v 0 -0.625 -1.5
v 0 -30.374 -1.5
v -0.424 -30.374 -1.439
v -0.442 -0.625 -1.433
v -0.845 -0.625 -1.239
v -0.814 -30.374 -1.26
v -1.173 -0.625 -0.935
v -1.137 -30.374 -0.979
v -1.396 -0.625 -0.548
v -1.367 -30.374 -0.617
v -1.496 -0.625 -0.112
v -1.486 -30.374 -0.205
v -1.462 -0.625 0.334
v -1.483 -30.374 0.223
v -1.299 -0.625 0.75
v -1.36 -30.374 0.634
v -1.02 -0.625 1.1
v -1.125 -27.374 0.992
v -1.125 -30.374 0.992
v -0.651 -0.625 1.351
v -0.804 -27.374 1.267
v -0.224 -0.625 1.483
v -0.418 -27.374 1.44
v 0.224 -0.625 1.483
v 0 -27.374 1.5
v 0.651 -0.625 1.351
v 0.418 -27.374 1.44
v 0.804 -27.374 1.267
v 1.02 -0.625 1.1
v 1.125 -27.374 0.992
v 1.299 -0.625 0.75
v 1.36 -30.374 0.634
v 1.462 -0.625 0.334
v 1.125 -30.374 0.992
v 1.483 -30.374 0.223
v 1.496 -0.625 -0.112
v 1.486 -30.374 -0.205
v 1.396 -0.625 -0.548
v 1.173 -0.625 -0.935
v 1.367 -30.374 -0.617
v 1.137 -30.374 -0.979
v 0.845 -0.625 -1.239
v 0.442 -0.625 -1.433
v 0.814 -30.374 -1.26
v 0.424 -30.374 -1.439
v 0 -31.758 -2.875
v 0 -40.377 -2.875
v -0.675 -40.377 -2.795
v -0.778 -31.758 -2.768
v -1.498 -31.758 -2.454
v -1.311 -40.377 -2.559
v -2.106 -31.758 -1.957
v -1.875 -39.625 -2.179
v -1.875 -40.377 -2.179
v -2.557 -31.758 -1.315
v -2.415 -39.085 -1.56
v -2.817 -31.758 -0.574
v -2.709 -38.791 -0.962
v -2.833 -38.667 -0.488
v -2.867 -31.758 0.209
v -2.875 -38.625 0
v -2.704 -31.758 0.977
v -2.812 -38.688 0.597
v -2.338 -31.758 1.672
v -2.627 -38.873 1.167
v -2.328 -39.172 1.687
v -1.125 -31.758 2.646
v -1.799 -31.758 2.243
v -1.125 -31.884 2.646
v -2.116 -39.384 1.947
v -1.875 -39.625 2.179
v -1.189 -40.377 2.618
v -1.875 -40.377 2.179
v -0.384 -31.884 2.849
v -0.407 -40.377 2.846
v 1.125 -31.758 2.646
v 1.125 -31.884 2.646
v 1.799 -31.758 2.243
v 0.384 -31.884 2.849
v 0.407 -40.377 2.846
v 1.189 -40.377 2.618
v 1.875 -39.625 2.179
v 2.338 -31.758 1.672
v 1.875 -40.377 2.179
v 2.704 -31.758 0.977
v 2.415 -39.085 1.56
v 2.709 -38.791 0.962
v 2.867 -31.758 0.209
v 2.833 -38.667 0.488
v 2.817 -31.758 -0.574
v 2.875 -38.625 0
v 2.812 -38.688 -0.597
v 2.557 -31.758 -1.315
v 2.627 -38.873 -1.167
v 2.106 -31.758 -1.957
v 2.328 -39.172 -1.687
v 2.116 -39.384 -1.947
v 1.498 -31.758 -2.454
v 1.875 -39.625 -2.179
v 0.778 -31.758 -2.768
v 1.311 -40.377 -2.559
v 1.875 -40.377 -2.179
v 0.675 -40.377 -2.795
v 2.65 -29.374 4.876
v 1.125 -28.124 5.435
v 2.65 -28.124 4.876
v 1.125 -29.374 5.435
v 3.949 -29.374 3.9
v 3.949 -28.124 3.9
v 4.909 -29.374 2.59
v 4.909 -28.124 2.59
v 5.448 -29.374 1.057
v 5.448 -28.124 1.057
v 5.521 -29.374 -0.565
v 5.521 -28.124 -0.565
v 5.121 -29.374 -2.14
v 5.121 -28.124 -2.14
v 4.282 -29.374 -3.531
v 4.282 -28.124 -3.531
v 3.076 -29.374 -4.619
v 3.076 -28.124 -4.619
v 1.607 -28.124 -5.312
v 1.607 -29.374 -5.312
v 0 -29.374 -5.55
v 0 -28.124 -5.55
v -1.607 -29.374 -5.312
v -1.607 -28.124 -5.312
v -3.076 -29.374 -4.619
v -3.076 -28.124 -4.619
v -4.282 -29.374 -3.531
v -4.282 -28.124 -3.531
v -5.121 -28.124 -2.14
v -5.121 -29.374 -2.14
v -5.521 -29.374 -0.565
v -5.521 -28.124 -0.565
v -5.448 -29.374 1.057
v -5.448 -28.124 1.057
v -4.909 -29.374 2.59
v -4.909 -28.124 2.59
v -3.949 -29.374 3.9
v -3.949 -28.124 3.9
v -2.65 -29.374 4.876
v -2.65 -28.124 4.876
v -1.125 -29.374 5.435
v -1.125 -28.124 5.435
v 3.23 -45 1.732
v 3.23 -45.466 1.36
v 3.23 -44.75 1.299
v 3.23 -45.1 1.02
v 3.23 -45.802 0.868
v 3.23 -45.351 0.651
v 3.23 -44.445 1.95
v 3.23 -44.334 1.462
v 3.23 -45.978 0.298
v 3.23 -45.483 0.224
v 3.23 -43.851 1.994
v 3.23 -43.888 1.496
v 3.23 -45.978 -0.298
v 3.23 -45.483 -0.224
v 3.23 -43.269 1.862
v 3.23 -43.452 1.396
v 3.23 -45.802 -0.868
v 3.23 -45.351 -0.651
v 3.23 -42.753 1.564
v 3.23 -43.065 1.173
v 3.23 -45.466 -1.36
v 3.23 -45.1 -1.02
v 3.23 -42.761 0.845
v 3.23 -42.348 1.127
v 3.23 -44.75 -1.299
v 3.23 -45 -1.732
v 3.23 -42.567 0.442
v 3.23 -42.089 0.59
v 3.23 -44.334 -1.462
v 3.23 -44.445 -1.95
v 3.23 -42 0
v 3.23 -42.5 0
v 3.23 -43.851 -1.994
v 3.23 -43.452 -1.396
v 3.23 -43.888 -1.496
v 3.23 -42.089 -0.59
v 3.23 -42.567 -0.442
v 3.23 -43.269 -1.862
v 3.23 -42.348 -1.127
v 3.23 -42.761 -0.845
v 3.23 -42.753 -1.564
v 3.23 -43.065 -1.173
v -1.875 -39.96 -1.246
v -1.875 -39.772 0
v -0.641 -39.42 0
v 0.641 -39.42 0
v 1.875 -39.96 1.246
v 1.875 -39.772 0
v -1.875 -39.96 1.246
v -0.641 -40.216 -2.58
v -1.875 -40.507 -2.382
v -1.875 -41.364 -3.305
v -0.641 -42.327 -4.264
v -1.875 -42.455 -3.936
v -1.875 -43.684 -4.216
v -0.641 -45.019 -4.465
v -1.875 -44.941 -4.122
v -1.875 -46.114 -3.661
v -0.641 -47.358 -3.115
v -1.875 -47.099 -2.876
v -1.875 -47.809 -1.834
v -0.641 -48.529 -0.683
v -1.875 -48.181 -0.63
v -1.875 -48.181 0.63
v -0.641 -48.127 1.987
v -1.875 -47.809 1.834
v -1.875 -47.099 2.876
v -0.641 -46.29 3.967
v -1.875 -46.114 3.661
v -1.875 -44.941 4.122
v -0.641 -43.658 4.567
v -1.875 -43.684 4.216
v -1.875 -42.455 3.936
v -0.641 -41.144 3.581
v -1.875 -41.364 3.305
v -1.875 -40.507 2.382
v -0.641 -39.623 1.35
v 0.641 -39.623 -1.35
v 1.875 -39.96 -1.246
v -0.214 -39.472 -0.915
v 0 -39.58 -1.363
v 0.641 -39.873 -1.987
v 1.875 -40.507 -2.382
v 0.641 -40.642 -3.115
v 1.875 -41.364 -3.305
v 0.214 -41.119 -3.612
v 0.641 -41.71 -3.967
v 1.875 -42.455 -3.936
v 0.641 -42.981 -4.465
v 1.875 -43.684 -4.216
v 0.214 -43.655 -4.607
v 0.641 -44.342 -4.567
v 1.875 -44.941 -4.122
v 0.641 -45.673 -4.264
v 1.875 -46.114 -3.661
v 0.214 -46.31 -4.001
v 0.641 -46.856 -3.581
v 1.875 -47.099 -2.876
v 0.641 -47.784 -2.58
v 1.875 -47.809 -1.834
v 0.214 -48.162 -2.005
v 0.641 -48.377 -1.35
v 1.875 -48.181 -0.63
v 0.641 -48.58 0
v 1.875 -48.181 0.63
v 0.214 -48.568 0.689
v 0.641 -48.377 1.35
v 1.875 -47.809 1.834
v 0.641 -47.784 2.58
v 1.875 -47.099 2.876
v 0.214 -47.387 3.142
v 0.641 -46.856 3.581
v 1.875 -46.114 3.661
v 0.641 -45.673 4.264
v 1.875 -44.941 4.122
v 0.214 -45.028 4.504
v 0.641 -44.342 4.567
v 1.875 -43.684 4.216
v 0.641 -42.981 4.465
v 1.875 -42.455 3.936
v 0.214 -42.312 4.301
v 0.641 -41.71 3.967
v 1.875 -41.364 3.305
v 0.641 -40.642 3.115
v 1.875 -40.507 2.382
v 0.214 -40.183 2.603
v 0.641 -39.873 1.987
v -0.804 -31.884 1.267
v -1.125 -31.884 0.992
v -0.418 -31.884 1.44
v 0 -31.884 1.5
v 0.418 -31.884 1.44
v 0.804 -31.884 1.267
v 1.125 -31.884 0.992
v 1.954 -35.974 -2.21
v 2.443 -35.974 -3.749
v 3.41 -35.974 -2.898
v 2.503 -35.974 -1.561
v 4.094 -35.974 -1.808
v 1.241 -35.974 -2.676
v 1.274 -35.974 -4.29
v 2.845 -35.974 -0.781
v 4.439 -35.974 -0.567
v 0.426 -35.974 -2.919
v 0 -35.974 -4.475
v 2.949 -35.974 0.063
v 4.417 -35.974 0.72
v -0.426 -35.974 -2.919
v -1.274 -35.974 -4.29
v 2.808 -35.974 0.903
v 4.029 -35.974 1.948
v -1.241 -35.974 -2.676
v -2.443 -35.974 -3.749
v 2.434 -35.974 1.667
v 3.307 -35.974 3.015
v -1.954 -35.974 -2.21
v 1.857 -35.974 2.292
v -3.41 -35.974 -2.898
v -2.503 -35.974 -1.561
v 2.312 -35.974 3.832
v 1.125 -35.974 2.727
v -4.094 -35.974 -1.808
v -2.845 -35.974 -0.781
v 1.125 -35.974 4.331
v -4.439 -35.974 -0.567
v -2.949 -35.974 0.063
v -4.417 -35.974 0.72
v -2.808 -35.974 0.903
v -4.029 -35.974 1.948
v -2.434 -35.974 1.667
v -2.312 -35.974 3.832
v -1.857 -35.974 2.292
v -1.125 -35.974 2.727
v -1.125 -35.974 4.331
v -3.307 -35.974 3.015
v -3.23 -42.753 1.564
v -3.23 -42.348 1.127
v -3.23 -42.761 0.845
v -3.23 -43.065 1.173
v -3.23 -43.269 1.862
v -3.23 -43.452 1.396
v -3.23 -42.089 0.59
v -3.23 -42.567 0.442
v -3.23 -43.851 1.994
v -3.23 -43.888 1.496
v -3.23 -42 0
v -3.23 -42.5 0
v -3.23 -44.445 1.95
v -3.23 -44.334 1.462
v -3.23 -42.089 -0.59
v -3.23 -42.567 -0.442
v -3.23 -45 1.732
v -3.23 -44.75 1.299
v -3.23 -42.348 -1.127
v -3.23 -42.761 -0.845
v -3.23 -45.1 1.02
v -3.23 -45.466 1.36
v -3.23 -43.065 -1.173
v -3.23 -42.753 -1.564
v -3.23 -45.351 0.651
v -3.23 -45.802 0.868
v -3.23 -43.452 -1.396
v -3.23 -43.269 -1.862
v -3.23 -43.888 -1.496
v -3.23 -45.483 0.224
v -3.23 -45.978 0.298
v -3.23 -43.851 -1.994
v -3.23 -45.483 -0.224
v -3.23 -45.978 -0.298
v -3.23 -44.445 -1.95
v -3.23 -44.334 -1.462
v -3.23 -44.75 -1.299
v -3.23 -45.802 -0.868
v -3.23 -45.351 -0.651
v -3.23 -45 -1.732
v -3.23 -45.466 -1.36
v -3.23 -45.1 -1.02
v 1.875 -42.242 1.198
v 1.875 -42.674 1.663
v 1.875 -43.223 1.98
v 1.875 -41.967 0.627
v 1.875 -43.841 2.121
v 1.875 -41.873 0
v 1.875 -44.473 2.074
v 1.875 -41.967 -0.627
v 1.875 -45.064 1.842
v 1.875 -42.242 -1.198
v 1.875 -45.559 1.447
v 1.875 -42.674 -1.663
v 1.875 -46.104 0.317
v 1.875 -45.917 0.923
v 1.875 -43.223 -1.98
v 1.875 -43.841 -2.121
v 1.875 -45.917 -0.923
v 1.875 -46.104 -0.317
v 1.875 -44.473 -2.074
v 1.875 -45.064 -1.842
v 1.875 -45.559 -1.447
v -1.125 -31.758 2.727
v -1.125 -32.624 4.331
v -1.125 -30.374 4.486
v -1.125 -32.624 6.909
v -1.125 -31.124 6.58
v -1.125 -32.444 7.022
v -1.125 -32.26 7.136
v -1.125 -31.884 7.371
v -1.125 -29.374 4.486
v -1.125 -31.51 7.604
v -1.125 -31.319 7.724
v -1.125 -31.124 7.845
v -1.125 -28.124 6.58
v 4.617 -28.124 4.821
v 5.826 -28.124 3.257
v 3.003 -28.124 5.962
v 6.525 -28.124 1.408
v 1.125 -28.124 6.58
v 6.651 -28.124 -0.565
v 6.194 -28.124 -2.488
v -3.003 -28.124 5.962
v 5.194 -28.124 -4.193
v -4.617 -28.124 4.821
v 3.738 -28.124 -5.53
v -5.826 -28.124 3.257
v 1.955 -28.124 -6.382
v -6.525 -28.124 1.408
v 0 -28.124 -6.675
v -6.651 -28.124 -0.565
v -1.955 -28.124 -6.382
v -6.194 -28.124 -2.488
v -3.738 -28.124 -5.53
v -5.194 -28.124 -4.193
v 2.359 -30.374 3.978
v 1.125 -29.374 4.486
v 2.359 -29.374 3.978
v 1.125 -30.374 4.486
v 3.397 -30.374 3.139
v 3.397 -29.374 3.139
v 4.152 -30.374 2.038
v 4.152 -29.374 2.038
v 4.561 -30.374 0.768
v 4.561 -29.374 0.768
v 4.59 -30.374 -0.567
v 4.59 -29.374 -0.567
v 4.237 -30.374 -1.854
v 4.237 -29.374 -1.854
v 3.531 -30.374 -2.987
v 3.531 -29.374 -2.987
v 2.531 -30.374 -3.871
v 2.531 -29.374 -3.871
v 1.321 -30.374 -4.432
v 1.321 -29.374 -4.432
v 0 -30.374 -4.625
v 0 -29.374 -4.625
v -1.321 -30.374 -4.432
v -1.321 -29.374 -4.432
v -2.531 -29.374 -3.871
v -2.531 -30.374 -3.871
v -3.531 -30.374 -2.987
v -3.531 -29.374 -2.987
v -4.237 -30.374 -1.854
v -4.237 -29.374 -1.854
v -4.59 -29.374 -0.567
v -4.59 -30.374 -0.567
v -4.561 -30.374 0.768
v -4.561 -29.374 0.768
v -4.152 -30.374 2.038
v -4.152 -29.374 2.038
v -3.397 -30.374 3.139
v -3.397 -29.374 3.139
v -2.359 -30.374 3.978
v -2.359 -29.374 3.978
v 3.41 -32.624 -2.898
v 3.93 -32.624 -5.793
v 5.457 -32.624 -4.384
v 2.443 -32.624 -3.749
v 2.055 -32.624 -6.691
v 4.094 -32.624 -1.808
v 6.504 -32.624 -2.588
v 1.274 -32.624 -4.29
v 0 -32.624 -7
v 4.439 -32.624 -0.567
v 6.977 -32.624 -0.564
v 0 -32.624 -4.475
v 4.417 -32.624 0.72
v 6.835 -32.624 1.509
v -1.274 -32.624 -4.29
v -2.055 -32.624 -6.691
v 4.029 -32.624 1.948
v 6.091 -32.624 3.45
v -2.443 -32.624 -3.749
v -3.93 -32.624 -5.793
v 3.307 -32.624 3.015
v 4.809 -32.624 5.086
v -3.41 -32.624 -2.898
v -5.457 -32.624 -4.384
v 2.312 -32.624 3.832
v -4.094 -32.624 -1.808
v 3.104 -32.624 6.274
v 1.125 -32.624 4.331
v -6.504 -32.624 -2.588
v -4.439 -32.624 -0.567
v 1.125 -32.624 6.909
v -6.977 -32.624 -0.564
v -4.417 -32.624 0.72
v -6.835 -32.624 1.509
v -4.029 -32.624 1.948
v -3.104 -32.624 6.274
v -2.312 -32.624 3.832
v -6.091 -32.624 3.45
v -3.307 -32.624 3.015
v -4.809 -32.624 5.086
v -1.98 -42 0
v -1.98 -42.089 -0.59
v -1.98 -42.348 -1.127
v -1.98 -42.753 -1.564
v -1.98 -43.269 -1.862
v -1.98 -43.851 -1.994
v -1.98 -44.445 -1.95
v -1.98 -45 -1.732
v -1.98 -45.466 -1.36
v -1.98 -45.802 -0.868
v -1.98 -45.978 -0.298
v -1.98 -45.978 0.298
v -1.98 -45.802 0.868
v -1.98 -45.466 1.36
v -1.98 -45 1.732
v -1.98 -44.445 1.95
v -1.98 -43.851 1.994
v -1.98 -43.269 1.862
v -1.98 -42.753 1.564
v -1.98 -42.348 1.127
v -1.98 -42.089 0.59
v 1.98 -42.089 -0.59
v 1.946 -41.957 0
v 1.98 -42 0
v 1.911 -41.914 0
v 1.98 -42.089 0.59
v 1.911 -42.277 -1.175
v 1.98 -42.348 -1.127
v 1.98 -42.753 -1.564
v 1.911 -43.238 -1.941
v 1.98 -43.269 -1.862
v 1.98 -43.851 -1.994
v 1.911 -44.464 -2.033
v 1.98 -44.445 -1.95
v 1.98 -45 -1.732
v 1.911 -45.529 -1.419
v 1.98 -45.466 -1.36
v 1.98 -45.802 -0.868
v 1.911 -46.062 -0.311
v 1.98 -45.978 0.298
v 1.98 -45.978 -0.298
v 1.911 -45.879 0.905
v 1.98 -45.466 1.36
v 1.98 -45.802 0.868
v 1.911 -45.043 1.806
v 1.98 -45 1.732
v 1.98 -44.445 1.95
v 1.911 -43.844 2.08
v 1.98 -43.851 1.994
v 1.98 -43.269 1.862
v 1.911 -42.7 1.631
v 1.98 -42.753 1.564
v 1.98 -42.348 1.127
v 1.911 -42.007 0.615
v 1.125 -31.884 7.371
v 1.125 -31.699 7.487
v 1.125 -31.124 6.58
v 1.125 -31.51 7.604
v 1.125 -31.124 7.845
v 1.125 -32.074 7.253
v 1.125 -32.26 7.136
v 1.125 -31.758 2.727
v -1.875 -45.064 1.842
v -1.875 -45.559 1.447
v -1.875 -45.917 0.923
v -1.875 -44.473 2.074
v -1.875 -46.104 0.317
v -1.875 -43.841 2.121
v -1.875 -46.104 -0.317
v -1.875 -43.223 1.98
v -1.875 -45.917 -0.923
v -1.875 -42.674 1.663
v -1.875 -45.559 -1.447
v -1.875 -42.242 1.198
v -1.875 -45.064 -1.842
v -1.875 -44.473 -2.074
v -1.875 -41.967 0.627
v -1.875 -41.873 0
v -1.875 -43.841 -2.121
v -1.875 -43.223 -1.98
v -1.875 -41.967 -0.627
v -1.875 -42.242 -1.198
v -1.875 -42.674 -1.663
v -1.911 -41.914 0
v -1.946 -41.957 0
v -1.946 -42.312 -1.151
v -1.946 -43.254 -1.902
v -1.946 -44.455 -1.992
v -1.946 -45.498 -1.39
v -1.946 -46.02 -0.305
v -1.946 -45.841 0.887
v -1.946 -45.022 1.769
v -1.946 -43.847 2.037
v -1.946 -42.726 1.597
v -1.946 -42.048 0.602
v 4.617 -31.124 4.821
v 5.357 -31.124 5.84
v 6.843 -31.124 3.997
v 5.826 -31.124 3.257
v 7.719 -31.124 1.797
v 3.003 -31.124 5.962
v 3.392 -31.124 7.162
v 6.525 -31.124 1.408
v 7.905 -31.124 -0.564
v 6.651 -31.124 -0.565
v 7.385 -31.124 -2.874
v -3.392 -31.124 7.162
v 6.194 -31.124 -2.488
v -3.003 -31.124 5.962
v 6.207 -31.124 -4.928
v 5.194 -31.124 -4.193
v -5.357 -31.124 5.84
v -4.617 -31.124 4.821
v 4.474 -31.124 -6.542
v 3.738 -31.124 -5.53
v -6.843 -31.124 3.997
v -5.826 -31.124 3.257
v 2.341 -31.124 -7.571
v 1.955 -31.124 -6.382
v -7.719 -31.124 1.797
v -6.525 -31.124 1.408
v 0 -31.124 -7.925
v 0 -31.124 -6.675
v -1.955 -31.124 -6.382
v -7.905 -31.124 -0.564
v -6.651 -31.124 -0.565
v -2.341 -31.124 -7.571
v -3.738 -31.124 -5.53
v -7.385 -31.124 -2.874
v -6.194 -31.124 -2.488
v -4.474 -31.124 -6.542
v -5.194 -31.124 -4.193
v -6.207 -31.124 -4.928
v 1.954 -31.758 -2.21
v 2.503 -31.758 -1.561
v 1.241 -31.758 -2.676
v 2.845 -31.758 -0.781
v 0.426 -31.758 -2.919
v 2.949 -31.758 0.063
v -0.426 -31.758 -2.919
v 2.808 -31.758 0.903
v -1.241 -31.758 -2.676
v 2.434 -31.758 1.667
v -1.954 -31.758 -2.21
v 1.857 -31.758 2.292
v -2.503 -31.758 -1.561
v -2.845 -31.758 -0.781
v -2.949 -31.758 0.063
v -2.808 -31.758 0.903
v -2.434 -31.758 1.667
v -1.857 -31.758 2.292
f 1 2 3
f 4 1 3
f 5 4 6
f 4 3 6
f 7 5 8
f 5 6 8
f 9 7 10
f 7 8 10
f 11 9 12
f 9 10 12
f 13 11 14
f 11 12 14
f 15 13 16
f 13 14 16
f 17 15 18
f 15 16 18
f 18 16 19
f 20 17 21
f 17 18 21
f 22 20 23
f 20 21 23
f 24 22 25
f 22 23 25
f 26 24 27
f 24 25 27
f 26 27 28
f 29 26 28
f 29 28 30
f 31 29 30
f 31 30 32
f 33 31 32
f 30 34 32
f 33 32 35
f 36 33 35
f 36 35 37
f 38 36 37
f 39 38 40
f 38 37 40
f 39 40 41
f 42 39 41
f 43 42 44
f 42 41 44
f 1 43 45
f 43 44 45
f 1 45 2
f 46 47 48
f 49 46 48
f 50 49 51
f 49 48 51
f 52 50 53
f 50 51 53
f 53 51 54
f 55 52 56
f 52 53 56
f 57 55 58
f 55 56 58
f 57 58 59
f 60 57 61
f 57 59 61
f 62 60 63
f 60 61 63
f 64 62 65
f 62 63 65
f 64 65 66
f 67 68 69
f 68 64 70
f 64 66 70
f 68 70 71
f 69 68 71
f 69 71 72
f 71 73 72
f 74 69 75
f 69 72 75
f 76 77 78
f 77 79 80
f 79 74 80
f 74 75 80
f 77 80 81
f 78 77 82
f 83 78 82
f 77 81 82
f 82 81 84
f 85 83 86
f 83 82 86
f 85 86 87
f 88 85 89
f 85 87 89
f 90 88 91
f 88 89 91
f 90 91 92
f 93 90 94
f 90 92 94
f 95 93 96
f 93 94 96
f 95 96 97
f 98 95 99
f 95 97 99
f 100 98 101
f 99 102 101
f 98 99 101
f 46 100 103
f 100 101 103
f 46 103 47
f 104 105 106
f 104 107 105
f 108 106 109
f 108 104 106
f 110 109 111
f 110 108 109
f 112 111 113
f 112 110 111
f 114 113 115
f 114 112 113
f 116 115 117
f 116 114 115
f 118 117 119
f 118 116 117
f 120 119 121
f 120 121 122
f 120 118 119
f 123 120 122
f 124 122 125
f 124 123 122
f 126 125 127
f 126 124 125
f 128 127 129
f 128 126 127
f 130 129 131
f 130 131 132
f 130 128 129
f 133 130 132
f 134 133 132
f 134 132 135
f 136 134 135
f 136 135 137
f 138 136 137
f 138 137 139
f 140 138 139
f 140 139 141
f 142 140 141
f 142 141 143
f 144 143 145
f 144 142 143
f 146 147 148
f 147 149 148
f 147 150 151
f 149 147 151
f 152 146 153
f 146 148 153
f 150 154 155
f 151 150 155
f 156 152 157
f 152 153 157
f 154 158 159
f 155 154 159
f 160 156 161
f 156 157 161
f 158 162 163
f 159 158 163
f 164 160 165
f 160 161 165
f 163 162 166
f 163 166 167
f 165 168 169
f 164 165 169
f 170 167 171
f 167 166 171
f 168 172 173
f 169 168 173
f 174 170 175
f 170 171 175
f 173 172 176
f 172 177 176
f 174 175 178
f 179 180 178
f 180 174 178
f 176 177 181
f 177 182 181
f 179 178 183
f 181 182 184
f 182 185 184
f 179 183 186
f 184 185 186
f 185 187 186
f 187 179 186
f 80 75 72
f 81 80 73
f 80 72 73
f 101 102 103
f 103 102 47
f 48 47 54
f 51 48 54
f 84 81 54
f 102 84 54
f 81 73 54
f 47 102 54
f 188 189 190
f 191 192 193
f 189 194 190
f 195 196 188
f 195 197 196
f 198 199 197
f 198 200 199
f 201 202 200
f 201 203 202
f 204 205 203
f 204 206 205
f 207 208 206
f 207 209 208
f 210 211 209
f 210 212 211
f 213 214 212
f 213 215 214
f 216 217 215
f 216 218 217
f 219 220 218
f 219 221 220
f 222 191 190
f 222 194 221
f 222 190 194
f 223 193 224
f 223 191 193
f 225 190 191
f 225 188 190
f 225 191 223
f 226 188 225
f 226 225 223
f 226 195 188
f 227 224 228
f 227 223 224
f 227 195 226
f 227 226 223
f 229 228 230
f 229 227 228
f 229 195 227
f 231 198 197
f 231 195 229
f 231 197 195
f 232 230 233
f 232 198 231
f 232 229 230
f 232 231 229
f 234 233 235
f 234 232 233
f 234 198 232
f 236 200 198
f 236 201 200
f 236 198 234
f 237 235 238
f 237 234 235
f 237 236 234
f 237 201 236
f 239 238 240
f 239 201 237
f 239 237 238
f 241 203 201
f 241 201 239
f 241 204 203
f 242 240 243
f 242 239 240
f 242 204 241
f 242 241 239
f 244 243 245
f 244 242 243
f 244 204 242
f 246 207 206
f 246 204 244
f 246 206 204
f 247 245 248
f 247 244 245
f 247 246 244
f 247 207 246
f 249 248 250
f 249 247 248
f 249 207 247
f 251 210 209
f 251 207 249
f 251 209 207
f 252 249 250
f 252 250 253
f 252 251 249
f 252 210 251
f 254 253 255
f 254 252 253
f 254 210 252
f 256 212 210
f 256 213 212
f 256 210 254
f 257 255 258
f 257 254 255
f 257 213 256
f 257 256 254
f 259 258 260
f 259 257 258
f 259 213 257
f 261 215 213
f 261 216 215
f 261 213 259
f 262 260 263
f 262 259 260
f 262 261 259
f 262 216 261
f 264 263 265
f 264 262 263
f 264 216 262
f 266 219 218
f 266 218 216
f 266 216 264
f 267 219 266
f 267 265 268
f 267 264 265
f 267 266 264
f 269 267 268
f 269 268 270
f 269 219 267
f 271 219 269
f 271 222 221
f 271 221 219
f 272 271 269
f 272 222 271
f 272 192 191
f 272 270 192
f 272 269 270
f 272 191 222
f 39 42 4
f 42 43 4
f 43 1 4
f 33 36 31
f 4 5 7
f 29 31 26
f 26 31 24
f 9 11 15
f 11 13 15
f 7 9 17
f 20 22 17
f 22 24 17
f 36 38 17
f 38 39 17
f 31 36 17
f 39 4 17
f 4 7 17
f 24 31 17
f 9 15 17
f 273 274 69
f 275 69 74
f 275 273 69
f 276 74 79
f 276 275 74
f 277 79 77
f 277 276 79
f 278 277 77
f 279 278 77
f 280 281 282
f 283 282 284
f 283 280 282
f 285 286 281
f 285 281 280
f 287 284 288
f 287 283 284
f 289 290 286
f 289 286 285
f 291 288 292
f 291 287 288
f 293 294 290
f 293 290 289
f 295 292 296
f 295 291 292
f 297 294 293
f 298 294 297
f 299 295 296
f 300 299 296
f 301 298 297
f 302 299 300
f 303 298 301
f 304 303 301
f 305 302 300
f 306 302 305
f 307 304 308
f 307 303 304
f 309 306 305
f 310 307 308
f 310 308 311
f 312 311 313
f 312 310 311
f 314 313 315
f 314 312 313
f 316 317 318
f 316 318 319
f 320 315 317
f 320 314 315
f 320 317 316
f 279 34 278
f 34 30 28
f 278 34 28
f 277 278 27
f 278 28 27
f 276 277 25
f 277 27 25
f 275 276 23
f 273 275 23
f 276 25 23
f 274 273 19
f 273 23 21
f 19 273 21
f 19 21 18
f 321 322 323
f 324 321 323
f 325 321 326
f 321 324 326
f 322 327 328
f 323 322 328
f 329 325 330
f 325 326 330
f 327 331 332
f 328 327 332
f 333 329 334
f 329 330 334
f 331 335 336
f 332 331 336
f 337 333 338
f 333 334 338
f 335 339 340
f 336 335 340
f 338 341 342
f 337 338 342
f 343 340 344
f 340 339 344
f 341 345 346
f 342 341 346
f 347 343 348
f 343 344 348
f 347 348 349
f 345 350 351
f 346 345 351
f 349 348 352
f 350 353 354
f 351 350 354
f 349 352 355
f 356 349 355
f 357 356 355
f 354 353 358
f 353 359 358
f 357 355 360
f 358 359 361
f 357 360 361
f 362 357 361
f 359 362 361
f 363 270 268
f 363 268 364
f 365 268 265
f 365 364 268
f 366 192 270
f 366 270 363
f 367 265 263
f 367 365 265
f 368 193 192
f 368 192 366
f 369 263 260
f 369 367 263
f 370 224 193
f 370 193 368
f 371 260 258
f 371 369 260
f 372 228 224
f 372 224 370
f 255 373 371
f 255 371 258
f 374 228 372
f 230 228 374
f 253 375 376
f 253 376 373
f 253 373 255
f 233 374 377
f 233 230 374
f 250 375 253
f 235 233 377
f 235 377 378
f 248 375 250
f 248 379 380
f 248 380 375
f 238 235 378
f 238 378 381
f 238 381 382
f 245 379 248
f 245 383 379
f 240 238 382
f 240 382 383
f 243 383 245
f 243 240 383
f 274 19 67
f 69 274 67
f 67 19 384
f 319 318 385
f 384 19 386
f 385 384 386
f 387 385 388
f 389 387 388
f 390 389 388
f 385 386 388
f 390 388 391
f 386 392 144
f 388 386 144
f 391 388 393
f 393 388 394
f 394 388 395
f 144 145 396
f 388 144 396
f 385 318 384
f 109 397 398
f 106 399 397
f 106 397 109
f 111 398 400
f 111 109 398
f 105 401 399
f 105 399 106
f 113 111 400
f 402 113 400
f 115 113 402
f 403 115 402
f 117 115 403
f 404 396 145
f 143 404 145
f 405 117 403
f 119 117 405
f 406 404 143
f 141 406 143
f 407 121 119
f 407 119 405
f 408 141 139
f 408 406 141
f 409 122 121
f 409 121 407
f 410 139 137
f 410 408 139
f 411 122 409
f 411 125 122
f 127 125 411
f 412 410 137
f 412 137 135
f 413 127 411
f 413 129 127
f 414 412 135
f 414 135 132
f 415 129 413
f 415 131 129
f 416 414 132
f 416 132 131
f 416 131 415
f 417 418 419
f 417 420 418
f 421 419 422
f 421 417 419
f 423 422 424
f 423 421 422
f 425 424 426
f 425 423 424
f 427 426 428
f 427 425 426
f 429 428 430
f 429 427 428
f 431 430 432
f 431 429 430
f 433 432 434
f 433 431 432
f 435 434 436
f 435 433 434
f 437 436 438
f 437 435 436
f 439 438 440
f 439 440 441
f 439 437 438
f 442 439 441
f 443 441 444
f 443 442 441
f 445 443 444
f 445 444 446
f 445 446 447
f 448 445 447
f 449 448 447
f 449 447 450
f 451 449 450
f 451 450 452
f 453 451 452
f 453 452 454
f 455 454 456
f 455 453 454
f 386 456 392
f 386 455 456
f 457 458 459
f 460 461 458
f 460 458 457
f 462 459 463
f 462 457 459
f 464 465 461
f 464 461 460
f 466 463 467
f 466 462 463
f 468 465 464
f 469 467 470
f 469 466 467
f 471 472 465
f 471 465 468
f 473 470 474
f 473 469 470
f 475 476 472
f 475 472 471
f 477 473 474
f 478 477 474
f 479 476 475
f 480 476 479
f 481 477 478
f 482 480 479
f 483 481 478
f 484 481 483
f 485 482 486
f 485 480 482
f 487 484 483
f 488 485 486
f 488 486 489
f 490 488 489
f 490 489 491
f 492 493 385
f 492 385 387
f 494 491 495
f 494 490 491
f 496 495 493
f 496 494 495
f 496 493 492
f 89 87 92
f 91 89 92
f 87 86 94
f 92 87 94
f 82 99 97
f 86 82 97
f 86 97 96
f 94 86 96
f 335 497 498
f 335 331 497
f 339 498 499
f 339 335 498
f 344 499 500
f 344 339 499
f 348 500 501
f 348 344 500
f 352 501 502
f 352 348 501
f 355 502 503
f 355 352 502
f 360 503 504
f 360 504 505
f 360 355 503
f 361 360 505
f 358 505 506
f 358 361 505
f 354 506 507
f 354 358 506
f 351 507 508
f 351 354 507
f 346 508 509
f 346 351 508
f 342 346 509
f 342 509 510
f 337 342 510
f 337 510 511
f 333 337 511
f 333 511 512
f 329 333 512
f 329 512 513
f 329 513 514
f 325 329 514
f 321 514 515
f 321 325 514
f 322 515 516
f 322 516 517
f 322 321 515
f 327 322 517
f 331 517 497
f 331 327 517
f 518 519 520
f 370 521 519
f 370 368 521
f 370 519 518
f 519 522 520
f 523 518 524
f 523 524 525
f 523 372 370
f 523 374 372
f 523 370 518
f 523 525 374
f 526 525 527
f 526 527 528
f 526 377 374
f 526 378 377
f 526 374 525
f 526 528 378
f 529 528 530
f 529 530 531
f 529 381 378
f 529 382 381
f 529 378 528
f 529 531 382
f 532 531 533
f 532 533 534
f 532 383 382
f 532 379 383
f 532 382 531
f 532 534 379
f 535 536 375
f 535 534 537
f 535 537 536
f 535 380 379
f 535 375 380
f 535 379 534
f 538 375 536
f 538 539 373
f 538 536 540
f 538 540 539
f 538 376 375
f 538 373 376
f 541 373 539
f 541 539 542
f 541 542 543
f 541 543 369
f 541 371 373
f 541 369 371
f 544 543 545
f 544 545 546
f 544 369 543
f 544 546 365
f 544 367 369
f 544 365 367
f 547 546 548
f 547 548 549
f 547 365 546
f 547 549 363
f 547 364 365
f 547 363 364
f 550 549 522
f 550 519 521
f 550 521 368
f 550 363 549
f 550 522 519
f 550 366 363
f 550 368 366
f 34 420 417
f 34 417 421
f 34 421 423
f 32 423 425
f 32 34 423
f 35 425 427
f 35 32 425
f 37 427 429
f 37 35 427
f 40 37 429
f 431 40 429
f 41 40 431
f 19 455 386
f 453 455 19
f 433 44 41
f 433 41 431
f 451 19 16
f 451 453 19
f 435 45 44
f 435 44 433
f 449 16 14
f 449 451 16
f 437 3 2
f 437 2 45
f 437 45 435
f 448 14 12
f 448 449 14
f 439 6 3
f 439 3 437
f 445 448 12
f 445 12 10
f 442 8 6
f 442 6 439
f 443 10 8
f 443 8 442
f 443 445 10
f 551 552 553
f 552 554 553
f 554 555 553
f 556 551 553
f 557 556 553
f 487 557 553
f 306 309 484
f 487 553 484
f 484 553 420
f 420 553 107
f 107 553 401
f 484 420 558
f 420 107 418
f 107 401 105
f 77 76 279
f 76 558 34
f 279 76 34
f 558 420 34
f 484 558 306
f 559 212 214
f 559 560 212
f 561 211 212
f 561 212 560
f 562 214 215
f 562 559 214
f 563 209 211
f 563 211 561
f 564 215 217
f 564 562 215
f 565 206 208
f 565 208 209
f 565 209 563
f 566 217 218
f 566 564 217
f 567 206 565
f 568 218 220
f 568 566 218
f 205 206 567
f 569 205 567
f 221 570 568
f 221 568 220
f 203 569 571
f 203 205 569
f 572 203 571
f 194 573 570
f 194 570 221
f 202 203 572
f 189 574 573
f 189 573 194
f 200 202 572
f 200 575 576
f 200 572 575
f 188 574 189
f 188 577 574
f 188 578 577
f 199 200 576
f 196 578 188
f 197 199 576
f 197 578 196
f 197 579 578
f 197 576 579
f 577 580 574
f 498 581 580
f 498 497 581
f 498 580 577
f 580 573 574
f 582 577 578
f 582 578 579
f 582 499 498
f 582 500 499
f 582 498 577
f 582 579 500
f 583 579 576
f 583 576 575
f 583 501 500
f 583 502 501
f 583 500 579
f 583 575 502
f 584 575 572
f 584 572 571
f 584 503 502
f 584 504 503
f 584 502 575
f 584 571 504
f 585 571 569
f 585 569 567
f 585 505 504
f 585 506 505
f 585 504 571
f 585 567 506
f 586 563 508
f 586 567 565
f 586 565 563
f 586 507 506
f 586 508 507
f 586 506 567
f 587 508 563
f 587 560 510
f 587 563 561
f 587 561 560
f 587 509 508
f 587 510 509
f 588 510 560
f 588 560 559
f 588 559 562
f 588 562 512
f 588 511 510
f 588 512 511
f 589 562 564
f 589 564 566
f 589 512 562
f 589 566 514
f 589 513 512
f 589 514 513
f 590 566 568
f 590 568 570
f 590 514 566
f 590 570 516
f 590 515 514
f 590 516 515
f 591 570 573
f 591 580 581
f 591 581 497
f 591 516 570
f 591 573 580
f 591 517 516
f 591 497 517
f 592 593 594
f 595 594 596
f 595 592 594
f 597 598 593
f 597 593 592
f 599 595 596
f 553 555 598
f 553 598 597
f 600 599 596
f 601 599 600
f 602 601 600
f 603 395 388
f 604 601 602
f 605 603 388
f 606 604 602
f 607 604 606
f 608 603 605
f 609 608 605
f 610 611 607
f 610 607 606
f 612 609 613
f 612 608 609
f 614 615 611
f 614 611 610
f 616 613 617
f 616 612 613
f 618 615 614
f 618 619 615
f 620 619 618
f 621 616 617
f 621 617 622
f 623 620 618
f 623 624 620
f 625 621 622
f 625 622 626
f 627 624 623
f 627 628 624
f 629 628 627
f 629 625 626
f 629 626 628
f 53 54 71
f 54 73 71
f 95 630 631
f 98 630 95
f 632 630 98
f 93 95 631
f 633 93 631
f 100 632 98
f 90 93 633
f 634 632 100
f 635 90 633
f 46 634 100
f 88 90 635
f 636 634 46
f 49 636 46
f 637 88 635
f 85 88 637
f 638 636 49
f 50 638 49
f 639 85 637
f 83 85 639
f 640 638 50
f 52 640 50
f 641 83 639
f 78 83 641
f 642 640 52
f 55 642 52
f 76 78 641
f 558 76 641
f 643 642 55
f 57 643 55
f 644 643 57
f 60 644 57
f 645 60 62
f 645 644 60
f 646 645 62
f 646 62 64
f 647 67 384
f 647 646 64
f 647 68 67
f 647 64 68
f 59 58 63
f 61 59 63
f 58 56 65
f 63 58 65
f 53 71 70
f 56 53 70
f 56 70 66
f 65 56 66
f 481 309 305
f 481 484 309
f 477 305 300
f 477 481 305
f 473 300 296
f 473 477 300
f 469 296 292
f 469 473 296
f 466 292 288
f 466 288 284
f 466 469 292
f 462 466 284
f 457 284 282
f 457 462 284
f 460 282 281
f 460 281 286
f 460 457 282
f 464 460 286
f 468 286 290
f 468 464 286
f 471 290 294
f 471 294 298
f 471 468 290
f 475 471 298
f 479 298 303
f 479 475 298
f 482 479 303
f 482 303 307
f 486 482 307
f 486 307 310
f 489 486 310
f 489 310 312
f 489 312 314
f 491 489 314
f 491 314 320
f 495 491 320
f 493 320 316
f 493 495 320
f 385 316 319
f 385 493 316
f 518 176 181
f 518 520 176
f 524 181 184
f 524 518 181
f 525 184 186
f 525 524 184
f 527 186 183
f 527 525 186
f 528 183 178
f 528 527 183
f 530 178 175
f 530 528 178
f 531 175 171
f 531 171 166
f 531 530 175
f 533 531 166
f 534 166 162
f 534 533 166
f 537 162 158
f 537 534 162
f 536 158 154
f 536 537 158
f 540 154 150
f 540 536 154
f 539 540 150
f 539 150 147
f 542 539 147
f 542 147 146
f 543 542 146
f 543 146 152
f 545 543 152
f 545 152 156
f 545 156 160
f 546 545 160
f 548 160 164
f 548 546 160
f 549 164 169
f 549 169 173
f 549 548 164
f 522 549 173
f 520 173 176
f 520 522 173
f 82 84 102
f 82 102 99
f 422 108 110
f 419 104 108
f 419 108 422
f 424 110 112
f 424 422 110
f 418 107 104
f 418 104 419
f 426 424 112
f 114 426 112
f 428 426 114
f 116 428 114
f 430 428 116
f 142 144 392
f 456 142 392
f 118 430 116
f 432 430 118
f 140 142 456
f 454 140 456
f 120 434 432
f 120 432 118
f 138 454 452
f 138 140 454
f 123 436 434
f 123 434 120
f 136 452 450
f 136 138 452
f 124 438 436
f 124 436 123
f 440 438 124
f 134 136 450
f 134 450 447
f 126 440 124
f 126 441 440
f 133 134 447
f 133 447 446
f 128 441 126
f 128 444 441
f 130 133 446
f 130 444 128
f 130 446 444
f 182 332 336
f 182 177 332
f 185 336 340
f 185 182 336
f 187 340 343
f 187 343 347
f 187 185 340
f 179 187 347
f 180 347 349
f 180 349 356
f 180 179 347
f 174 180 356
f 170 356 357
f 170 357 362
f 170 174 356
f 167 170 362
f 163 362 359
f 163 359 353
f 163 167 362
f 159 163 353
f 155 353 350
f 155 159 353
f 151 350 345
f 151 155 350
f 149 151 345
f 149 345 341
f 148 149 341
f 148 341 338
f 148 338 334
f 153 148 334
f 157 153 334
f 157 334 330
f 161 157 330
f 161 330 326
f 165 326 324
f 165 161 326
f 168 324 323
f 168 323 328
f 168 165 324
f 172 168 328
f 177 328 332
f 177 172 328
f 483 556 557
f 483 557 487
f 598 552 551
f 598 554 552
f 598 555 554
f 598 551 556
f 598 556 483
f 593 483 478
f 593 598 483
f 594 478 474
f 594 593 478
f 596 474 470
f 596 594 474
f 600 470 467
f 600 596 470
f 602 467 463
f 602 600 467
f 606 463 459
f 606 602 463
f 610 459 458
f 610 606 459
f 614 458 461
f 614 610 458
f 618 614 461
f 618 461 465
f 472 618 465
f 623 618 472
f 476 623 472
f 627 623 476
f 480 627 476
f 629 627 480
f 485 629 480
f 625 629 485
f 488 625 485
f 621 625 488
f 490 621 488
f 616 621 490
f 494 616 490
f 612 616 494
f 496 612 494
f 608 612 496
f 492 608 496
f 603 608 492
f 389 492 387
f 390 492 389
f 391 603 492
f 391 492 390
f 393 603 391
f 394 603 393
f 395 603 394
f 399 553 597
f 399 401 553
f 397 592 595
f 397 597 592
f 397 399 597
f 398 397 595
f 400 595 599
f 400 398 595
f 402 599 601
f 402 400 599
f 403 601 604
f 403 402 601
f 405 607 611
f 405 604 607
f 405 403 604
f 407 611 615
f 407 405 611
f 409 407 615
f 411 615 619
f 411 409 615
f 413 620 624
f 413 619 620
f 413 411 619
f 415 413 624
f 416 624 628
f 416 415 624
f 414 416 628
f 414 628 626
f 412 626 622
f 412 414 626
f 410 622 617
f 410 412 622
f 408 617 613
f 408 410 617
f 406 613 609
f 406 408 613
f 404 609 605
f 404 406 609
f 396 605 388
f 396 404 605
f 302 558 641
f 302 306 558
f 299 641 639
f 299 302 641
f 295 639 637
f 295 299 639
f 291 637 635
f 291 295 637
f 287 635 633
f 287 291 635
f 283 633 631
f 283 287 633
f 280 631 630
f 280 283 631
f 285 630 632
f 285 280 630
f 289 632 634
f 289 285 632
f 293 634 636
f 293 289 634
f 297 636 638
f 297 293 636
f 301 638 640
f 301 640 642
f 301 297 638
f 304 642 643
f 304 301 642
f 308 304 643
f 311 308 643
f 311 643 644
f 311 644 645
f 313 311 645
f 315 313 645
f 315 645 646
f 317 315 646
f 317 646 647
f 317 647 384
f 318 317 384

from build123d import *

# Parameters (mm, degrees)
CUT_EXTRUDE1_DEPTH      = 5
CUT_EXTRUDE2_DEPTH      = 3
CUT_EXTRUDE2_DEPTH_BACK = 1.51
CUT_EXTRUDE3_DEPTH      = 6


with BuildPart() as part:
    # Sketch2 → Revolve1 (revolve)
    with BuildSketch(Plane(origin=(0, 0, 0), x_dir=(0, 0, -1), z_dir=(1, 0, 0))):
        Polygon((0, -0.625), (1.5, -0.625), (1.5, -30.625), (2.875, -30.625), (2.875, -40.377156), (0, -40.377156), align=None)
    revolve(axis=Axis((0, -44, 0), (0, 1, 0)))

    # Sketch4 → Cut-Extrude1 (cut, symmetric)
    with BuildSketch(Plane.XY):
        Polygon((1.875, -47.625716), (1.875, -39.625), (2.875, -38.625), (2.875, -47.625716), align=None)
        Polygon((-1.875, -39.625), (-2.875, -38.625), (-2.875, -47.625716), (-1.875, -47.625716), align=None)
    extrude(amount=CUT_EXTRUDE1_DEPTH, both=True, mode=Mode.SUBTRACT)

    # Sketch5 → Revolve3 (revolve)
    with BuildSketch(Plane(origin=(0, 0, 0), x_dir=(0, 0, -1), z_dir=(1, 0, 0))):
        Polygon((4.625, -30.374201), (1.5, -30.374201), (1.5, -31.757852), (2.95, -31.757852), (2.95, -35.974201), (4.475, -35.974201), (4.475, -32.624201), (7, -32.624201), (7.925, -31.124201), (6.675, -31.124201), (6.675, -28.124201), (5.55, -28.124201), (5.55, -29.374201), (4.625, -29.374201), align=None)
    revolve(axis=Axis((0, -44, 0), (0, 1, 0)))

    # Sketch6 → Cut-Extrude2 (cut, two sides)
    with BuildSketch(Plane(origin=(0, -30.374201, 0), x_dir=(1, 0, 0), z_dir=(0, 1, 0))) as cut_extrude2_sk:
        with BuildLine():
            Line((-1.125, -0.992157), (-1.125, -8.743655))
            Line((-1.125, -8.743655), (1.125, -8.743655))
            Line((1.125, -8.743655), (1.125, -0.992157))
            ThreePointArc((1.125, -0.992157), (0, -1.5), (-1.125, -0.992157))
        make_face()
    extrude(amount=CUT_EXTRUDE2_DEPTH, mode=Mode.SUBTRACT)
    extrude(cut_extrude2_sk.sketch, amount=-CUT_EXTRUDE2_DEPTH_BACK, mode=Mode.SUBTRACT)

    # Sketch7 → Cut-Extrude3 (cut)
    with BuildSketch(Plane(origin=(0, -31.884201, 0), x_dir=(1, 0, 0), z_dir=(0, 1, 0))):
        with BuildLine():
            Line((-1.125, -4.331282), (-1.125, -2.727063))
            ThreePointArc((-1.125, -2.727063), (0, -2.95), (1.125, -2.727063))
            Line((1.125, -2.727063), (1.125, -4.331282))
            Line((1.125, -4.331282), (1.125, -8.743655))
            Line((1.125, -8.743655), (-1.125, -8.743655))
            Line((-1.125, -8.743655), (-1.125, -4.331282))
        make_face()
    extrude(amount=-CUT_EXTRUDE3_DEPTH, mode=Mode.SUBTRACT)


with BuildPart() as body_2:
    # Sketch3 → Spherical Bearing (revolve)
    with BuildSketch(Plane.XY):
        Polygon((3.23, -42.5), (0, -42.5), (-3.23, -42.5), (-3.23, -42), (0, -42), (3.23, -42), align=None)
        with BuildLine():
            ThreePointArc((-1.875, -41.872708), (-1.928551, -41.935488), (-1.98, -42))
            Line((-1.98, -42), (0, -42))
            Line((0, -42), (1.98, -42))
            ThreePointArc((1.98, -42), (1.928551, -41.935488), (1.875, -41.872708))
            ThreePointArc((1.875, -41.872708), (0, -41.026303), (-1.875, -41.872708))
        make_face()
        with BuildLine():
            Line((-1.875, -39.772116), (-1.875, -41.872708))
            ThreePointArc((-1.875, -41.872708), (0, -41.026303), (1.875, -41.872708))
            Line((1.875, -41.872708), (1.875, -39.772116))
            ThreePointArc((1.875, -39.772116), (0, -39.375), (-1.875, -39.772116))
        make_face()
    revolve(axis=Axis((9.866349, -44, 0), (-1, 0, 0)))


solid = Compound([part.part, body_2.part])
